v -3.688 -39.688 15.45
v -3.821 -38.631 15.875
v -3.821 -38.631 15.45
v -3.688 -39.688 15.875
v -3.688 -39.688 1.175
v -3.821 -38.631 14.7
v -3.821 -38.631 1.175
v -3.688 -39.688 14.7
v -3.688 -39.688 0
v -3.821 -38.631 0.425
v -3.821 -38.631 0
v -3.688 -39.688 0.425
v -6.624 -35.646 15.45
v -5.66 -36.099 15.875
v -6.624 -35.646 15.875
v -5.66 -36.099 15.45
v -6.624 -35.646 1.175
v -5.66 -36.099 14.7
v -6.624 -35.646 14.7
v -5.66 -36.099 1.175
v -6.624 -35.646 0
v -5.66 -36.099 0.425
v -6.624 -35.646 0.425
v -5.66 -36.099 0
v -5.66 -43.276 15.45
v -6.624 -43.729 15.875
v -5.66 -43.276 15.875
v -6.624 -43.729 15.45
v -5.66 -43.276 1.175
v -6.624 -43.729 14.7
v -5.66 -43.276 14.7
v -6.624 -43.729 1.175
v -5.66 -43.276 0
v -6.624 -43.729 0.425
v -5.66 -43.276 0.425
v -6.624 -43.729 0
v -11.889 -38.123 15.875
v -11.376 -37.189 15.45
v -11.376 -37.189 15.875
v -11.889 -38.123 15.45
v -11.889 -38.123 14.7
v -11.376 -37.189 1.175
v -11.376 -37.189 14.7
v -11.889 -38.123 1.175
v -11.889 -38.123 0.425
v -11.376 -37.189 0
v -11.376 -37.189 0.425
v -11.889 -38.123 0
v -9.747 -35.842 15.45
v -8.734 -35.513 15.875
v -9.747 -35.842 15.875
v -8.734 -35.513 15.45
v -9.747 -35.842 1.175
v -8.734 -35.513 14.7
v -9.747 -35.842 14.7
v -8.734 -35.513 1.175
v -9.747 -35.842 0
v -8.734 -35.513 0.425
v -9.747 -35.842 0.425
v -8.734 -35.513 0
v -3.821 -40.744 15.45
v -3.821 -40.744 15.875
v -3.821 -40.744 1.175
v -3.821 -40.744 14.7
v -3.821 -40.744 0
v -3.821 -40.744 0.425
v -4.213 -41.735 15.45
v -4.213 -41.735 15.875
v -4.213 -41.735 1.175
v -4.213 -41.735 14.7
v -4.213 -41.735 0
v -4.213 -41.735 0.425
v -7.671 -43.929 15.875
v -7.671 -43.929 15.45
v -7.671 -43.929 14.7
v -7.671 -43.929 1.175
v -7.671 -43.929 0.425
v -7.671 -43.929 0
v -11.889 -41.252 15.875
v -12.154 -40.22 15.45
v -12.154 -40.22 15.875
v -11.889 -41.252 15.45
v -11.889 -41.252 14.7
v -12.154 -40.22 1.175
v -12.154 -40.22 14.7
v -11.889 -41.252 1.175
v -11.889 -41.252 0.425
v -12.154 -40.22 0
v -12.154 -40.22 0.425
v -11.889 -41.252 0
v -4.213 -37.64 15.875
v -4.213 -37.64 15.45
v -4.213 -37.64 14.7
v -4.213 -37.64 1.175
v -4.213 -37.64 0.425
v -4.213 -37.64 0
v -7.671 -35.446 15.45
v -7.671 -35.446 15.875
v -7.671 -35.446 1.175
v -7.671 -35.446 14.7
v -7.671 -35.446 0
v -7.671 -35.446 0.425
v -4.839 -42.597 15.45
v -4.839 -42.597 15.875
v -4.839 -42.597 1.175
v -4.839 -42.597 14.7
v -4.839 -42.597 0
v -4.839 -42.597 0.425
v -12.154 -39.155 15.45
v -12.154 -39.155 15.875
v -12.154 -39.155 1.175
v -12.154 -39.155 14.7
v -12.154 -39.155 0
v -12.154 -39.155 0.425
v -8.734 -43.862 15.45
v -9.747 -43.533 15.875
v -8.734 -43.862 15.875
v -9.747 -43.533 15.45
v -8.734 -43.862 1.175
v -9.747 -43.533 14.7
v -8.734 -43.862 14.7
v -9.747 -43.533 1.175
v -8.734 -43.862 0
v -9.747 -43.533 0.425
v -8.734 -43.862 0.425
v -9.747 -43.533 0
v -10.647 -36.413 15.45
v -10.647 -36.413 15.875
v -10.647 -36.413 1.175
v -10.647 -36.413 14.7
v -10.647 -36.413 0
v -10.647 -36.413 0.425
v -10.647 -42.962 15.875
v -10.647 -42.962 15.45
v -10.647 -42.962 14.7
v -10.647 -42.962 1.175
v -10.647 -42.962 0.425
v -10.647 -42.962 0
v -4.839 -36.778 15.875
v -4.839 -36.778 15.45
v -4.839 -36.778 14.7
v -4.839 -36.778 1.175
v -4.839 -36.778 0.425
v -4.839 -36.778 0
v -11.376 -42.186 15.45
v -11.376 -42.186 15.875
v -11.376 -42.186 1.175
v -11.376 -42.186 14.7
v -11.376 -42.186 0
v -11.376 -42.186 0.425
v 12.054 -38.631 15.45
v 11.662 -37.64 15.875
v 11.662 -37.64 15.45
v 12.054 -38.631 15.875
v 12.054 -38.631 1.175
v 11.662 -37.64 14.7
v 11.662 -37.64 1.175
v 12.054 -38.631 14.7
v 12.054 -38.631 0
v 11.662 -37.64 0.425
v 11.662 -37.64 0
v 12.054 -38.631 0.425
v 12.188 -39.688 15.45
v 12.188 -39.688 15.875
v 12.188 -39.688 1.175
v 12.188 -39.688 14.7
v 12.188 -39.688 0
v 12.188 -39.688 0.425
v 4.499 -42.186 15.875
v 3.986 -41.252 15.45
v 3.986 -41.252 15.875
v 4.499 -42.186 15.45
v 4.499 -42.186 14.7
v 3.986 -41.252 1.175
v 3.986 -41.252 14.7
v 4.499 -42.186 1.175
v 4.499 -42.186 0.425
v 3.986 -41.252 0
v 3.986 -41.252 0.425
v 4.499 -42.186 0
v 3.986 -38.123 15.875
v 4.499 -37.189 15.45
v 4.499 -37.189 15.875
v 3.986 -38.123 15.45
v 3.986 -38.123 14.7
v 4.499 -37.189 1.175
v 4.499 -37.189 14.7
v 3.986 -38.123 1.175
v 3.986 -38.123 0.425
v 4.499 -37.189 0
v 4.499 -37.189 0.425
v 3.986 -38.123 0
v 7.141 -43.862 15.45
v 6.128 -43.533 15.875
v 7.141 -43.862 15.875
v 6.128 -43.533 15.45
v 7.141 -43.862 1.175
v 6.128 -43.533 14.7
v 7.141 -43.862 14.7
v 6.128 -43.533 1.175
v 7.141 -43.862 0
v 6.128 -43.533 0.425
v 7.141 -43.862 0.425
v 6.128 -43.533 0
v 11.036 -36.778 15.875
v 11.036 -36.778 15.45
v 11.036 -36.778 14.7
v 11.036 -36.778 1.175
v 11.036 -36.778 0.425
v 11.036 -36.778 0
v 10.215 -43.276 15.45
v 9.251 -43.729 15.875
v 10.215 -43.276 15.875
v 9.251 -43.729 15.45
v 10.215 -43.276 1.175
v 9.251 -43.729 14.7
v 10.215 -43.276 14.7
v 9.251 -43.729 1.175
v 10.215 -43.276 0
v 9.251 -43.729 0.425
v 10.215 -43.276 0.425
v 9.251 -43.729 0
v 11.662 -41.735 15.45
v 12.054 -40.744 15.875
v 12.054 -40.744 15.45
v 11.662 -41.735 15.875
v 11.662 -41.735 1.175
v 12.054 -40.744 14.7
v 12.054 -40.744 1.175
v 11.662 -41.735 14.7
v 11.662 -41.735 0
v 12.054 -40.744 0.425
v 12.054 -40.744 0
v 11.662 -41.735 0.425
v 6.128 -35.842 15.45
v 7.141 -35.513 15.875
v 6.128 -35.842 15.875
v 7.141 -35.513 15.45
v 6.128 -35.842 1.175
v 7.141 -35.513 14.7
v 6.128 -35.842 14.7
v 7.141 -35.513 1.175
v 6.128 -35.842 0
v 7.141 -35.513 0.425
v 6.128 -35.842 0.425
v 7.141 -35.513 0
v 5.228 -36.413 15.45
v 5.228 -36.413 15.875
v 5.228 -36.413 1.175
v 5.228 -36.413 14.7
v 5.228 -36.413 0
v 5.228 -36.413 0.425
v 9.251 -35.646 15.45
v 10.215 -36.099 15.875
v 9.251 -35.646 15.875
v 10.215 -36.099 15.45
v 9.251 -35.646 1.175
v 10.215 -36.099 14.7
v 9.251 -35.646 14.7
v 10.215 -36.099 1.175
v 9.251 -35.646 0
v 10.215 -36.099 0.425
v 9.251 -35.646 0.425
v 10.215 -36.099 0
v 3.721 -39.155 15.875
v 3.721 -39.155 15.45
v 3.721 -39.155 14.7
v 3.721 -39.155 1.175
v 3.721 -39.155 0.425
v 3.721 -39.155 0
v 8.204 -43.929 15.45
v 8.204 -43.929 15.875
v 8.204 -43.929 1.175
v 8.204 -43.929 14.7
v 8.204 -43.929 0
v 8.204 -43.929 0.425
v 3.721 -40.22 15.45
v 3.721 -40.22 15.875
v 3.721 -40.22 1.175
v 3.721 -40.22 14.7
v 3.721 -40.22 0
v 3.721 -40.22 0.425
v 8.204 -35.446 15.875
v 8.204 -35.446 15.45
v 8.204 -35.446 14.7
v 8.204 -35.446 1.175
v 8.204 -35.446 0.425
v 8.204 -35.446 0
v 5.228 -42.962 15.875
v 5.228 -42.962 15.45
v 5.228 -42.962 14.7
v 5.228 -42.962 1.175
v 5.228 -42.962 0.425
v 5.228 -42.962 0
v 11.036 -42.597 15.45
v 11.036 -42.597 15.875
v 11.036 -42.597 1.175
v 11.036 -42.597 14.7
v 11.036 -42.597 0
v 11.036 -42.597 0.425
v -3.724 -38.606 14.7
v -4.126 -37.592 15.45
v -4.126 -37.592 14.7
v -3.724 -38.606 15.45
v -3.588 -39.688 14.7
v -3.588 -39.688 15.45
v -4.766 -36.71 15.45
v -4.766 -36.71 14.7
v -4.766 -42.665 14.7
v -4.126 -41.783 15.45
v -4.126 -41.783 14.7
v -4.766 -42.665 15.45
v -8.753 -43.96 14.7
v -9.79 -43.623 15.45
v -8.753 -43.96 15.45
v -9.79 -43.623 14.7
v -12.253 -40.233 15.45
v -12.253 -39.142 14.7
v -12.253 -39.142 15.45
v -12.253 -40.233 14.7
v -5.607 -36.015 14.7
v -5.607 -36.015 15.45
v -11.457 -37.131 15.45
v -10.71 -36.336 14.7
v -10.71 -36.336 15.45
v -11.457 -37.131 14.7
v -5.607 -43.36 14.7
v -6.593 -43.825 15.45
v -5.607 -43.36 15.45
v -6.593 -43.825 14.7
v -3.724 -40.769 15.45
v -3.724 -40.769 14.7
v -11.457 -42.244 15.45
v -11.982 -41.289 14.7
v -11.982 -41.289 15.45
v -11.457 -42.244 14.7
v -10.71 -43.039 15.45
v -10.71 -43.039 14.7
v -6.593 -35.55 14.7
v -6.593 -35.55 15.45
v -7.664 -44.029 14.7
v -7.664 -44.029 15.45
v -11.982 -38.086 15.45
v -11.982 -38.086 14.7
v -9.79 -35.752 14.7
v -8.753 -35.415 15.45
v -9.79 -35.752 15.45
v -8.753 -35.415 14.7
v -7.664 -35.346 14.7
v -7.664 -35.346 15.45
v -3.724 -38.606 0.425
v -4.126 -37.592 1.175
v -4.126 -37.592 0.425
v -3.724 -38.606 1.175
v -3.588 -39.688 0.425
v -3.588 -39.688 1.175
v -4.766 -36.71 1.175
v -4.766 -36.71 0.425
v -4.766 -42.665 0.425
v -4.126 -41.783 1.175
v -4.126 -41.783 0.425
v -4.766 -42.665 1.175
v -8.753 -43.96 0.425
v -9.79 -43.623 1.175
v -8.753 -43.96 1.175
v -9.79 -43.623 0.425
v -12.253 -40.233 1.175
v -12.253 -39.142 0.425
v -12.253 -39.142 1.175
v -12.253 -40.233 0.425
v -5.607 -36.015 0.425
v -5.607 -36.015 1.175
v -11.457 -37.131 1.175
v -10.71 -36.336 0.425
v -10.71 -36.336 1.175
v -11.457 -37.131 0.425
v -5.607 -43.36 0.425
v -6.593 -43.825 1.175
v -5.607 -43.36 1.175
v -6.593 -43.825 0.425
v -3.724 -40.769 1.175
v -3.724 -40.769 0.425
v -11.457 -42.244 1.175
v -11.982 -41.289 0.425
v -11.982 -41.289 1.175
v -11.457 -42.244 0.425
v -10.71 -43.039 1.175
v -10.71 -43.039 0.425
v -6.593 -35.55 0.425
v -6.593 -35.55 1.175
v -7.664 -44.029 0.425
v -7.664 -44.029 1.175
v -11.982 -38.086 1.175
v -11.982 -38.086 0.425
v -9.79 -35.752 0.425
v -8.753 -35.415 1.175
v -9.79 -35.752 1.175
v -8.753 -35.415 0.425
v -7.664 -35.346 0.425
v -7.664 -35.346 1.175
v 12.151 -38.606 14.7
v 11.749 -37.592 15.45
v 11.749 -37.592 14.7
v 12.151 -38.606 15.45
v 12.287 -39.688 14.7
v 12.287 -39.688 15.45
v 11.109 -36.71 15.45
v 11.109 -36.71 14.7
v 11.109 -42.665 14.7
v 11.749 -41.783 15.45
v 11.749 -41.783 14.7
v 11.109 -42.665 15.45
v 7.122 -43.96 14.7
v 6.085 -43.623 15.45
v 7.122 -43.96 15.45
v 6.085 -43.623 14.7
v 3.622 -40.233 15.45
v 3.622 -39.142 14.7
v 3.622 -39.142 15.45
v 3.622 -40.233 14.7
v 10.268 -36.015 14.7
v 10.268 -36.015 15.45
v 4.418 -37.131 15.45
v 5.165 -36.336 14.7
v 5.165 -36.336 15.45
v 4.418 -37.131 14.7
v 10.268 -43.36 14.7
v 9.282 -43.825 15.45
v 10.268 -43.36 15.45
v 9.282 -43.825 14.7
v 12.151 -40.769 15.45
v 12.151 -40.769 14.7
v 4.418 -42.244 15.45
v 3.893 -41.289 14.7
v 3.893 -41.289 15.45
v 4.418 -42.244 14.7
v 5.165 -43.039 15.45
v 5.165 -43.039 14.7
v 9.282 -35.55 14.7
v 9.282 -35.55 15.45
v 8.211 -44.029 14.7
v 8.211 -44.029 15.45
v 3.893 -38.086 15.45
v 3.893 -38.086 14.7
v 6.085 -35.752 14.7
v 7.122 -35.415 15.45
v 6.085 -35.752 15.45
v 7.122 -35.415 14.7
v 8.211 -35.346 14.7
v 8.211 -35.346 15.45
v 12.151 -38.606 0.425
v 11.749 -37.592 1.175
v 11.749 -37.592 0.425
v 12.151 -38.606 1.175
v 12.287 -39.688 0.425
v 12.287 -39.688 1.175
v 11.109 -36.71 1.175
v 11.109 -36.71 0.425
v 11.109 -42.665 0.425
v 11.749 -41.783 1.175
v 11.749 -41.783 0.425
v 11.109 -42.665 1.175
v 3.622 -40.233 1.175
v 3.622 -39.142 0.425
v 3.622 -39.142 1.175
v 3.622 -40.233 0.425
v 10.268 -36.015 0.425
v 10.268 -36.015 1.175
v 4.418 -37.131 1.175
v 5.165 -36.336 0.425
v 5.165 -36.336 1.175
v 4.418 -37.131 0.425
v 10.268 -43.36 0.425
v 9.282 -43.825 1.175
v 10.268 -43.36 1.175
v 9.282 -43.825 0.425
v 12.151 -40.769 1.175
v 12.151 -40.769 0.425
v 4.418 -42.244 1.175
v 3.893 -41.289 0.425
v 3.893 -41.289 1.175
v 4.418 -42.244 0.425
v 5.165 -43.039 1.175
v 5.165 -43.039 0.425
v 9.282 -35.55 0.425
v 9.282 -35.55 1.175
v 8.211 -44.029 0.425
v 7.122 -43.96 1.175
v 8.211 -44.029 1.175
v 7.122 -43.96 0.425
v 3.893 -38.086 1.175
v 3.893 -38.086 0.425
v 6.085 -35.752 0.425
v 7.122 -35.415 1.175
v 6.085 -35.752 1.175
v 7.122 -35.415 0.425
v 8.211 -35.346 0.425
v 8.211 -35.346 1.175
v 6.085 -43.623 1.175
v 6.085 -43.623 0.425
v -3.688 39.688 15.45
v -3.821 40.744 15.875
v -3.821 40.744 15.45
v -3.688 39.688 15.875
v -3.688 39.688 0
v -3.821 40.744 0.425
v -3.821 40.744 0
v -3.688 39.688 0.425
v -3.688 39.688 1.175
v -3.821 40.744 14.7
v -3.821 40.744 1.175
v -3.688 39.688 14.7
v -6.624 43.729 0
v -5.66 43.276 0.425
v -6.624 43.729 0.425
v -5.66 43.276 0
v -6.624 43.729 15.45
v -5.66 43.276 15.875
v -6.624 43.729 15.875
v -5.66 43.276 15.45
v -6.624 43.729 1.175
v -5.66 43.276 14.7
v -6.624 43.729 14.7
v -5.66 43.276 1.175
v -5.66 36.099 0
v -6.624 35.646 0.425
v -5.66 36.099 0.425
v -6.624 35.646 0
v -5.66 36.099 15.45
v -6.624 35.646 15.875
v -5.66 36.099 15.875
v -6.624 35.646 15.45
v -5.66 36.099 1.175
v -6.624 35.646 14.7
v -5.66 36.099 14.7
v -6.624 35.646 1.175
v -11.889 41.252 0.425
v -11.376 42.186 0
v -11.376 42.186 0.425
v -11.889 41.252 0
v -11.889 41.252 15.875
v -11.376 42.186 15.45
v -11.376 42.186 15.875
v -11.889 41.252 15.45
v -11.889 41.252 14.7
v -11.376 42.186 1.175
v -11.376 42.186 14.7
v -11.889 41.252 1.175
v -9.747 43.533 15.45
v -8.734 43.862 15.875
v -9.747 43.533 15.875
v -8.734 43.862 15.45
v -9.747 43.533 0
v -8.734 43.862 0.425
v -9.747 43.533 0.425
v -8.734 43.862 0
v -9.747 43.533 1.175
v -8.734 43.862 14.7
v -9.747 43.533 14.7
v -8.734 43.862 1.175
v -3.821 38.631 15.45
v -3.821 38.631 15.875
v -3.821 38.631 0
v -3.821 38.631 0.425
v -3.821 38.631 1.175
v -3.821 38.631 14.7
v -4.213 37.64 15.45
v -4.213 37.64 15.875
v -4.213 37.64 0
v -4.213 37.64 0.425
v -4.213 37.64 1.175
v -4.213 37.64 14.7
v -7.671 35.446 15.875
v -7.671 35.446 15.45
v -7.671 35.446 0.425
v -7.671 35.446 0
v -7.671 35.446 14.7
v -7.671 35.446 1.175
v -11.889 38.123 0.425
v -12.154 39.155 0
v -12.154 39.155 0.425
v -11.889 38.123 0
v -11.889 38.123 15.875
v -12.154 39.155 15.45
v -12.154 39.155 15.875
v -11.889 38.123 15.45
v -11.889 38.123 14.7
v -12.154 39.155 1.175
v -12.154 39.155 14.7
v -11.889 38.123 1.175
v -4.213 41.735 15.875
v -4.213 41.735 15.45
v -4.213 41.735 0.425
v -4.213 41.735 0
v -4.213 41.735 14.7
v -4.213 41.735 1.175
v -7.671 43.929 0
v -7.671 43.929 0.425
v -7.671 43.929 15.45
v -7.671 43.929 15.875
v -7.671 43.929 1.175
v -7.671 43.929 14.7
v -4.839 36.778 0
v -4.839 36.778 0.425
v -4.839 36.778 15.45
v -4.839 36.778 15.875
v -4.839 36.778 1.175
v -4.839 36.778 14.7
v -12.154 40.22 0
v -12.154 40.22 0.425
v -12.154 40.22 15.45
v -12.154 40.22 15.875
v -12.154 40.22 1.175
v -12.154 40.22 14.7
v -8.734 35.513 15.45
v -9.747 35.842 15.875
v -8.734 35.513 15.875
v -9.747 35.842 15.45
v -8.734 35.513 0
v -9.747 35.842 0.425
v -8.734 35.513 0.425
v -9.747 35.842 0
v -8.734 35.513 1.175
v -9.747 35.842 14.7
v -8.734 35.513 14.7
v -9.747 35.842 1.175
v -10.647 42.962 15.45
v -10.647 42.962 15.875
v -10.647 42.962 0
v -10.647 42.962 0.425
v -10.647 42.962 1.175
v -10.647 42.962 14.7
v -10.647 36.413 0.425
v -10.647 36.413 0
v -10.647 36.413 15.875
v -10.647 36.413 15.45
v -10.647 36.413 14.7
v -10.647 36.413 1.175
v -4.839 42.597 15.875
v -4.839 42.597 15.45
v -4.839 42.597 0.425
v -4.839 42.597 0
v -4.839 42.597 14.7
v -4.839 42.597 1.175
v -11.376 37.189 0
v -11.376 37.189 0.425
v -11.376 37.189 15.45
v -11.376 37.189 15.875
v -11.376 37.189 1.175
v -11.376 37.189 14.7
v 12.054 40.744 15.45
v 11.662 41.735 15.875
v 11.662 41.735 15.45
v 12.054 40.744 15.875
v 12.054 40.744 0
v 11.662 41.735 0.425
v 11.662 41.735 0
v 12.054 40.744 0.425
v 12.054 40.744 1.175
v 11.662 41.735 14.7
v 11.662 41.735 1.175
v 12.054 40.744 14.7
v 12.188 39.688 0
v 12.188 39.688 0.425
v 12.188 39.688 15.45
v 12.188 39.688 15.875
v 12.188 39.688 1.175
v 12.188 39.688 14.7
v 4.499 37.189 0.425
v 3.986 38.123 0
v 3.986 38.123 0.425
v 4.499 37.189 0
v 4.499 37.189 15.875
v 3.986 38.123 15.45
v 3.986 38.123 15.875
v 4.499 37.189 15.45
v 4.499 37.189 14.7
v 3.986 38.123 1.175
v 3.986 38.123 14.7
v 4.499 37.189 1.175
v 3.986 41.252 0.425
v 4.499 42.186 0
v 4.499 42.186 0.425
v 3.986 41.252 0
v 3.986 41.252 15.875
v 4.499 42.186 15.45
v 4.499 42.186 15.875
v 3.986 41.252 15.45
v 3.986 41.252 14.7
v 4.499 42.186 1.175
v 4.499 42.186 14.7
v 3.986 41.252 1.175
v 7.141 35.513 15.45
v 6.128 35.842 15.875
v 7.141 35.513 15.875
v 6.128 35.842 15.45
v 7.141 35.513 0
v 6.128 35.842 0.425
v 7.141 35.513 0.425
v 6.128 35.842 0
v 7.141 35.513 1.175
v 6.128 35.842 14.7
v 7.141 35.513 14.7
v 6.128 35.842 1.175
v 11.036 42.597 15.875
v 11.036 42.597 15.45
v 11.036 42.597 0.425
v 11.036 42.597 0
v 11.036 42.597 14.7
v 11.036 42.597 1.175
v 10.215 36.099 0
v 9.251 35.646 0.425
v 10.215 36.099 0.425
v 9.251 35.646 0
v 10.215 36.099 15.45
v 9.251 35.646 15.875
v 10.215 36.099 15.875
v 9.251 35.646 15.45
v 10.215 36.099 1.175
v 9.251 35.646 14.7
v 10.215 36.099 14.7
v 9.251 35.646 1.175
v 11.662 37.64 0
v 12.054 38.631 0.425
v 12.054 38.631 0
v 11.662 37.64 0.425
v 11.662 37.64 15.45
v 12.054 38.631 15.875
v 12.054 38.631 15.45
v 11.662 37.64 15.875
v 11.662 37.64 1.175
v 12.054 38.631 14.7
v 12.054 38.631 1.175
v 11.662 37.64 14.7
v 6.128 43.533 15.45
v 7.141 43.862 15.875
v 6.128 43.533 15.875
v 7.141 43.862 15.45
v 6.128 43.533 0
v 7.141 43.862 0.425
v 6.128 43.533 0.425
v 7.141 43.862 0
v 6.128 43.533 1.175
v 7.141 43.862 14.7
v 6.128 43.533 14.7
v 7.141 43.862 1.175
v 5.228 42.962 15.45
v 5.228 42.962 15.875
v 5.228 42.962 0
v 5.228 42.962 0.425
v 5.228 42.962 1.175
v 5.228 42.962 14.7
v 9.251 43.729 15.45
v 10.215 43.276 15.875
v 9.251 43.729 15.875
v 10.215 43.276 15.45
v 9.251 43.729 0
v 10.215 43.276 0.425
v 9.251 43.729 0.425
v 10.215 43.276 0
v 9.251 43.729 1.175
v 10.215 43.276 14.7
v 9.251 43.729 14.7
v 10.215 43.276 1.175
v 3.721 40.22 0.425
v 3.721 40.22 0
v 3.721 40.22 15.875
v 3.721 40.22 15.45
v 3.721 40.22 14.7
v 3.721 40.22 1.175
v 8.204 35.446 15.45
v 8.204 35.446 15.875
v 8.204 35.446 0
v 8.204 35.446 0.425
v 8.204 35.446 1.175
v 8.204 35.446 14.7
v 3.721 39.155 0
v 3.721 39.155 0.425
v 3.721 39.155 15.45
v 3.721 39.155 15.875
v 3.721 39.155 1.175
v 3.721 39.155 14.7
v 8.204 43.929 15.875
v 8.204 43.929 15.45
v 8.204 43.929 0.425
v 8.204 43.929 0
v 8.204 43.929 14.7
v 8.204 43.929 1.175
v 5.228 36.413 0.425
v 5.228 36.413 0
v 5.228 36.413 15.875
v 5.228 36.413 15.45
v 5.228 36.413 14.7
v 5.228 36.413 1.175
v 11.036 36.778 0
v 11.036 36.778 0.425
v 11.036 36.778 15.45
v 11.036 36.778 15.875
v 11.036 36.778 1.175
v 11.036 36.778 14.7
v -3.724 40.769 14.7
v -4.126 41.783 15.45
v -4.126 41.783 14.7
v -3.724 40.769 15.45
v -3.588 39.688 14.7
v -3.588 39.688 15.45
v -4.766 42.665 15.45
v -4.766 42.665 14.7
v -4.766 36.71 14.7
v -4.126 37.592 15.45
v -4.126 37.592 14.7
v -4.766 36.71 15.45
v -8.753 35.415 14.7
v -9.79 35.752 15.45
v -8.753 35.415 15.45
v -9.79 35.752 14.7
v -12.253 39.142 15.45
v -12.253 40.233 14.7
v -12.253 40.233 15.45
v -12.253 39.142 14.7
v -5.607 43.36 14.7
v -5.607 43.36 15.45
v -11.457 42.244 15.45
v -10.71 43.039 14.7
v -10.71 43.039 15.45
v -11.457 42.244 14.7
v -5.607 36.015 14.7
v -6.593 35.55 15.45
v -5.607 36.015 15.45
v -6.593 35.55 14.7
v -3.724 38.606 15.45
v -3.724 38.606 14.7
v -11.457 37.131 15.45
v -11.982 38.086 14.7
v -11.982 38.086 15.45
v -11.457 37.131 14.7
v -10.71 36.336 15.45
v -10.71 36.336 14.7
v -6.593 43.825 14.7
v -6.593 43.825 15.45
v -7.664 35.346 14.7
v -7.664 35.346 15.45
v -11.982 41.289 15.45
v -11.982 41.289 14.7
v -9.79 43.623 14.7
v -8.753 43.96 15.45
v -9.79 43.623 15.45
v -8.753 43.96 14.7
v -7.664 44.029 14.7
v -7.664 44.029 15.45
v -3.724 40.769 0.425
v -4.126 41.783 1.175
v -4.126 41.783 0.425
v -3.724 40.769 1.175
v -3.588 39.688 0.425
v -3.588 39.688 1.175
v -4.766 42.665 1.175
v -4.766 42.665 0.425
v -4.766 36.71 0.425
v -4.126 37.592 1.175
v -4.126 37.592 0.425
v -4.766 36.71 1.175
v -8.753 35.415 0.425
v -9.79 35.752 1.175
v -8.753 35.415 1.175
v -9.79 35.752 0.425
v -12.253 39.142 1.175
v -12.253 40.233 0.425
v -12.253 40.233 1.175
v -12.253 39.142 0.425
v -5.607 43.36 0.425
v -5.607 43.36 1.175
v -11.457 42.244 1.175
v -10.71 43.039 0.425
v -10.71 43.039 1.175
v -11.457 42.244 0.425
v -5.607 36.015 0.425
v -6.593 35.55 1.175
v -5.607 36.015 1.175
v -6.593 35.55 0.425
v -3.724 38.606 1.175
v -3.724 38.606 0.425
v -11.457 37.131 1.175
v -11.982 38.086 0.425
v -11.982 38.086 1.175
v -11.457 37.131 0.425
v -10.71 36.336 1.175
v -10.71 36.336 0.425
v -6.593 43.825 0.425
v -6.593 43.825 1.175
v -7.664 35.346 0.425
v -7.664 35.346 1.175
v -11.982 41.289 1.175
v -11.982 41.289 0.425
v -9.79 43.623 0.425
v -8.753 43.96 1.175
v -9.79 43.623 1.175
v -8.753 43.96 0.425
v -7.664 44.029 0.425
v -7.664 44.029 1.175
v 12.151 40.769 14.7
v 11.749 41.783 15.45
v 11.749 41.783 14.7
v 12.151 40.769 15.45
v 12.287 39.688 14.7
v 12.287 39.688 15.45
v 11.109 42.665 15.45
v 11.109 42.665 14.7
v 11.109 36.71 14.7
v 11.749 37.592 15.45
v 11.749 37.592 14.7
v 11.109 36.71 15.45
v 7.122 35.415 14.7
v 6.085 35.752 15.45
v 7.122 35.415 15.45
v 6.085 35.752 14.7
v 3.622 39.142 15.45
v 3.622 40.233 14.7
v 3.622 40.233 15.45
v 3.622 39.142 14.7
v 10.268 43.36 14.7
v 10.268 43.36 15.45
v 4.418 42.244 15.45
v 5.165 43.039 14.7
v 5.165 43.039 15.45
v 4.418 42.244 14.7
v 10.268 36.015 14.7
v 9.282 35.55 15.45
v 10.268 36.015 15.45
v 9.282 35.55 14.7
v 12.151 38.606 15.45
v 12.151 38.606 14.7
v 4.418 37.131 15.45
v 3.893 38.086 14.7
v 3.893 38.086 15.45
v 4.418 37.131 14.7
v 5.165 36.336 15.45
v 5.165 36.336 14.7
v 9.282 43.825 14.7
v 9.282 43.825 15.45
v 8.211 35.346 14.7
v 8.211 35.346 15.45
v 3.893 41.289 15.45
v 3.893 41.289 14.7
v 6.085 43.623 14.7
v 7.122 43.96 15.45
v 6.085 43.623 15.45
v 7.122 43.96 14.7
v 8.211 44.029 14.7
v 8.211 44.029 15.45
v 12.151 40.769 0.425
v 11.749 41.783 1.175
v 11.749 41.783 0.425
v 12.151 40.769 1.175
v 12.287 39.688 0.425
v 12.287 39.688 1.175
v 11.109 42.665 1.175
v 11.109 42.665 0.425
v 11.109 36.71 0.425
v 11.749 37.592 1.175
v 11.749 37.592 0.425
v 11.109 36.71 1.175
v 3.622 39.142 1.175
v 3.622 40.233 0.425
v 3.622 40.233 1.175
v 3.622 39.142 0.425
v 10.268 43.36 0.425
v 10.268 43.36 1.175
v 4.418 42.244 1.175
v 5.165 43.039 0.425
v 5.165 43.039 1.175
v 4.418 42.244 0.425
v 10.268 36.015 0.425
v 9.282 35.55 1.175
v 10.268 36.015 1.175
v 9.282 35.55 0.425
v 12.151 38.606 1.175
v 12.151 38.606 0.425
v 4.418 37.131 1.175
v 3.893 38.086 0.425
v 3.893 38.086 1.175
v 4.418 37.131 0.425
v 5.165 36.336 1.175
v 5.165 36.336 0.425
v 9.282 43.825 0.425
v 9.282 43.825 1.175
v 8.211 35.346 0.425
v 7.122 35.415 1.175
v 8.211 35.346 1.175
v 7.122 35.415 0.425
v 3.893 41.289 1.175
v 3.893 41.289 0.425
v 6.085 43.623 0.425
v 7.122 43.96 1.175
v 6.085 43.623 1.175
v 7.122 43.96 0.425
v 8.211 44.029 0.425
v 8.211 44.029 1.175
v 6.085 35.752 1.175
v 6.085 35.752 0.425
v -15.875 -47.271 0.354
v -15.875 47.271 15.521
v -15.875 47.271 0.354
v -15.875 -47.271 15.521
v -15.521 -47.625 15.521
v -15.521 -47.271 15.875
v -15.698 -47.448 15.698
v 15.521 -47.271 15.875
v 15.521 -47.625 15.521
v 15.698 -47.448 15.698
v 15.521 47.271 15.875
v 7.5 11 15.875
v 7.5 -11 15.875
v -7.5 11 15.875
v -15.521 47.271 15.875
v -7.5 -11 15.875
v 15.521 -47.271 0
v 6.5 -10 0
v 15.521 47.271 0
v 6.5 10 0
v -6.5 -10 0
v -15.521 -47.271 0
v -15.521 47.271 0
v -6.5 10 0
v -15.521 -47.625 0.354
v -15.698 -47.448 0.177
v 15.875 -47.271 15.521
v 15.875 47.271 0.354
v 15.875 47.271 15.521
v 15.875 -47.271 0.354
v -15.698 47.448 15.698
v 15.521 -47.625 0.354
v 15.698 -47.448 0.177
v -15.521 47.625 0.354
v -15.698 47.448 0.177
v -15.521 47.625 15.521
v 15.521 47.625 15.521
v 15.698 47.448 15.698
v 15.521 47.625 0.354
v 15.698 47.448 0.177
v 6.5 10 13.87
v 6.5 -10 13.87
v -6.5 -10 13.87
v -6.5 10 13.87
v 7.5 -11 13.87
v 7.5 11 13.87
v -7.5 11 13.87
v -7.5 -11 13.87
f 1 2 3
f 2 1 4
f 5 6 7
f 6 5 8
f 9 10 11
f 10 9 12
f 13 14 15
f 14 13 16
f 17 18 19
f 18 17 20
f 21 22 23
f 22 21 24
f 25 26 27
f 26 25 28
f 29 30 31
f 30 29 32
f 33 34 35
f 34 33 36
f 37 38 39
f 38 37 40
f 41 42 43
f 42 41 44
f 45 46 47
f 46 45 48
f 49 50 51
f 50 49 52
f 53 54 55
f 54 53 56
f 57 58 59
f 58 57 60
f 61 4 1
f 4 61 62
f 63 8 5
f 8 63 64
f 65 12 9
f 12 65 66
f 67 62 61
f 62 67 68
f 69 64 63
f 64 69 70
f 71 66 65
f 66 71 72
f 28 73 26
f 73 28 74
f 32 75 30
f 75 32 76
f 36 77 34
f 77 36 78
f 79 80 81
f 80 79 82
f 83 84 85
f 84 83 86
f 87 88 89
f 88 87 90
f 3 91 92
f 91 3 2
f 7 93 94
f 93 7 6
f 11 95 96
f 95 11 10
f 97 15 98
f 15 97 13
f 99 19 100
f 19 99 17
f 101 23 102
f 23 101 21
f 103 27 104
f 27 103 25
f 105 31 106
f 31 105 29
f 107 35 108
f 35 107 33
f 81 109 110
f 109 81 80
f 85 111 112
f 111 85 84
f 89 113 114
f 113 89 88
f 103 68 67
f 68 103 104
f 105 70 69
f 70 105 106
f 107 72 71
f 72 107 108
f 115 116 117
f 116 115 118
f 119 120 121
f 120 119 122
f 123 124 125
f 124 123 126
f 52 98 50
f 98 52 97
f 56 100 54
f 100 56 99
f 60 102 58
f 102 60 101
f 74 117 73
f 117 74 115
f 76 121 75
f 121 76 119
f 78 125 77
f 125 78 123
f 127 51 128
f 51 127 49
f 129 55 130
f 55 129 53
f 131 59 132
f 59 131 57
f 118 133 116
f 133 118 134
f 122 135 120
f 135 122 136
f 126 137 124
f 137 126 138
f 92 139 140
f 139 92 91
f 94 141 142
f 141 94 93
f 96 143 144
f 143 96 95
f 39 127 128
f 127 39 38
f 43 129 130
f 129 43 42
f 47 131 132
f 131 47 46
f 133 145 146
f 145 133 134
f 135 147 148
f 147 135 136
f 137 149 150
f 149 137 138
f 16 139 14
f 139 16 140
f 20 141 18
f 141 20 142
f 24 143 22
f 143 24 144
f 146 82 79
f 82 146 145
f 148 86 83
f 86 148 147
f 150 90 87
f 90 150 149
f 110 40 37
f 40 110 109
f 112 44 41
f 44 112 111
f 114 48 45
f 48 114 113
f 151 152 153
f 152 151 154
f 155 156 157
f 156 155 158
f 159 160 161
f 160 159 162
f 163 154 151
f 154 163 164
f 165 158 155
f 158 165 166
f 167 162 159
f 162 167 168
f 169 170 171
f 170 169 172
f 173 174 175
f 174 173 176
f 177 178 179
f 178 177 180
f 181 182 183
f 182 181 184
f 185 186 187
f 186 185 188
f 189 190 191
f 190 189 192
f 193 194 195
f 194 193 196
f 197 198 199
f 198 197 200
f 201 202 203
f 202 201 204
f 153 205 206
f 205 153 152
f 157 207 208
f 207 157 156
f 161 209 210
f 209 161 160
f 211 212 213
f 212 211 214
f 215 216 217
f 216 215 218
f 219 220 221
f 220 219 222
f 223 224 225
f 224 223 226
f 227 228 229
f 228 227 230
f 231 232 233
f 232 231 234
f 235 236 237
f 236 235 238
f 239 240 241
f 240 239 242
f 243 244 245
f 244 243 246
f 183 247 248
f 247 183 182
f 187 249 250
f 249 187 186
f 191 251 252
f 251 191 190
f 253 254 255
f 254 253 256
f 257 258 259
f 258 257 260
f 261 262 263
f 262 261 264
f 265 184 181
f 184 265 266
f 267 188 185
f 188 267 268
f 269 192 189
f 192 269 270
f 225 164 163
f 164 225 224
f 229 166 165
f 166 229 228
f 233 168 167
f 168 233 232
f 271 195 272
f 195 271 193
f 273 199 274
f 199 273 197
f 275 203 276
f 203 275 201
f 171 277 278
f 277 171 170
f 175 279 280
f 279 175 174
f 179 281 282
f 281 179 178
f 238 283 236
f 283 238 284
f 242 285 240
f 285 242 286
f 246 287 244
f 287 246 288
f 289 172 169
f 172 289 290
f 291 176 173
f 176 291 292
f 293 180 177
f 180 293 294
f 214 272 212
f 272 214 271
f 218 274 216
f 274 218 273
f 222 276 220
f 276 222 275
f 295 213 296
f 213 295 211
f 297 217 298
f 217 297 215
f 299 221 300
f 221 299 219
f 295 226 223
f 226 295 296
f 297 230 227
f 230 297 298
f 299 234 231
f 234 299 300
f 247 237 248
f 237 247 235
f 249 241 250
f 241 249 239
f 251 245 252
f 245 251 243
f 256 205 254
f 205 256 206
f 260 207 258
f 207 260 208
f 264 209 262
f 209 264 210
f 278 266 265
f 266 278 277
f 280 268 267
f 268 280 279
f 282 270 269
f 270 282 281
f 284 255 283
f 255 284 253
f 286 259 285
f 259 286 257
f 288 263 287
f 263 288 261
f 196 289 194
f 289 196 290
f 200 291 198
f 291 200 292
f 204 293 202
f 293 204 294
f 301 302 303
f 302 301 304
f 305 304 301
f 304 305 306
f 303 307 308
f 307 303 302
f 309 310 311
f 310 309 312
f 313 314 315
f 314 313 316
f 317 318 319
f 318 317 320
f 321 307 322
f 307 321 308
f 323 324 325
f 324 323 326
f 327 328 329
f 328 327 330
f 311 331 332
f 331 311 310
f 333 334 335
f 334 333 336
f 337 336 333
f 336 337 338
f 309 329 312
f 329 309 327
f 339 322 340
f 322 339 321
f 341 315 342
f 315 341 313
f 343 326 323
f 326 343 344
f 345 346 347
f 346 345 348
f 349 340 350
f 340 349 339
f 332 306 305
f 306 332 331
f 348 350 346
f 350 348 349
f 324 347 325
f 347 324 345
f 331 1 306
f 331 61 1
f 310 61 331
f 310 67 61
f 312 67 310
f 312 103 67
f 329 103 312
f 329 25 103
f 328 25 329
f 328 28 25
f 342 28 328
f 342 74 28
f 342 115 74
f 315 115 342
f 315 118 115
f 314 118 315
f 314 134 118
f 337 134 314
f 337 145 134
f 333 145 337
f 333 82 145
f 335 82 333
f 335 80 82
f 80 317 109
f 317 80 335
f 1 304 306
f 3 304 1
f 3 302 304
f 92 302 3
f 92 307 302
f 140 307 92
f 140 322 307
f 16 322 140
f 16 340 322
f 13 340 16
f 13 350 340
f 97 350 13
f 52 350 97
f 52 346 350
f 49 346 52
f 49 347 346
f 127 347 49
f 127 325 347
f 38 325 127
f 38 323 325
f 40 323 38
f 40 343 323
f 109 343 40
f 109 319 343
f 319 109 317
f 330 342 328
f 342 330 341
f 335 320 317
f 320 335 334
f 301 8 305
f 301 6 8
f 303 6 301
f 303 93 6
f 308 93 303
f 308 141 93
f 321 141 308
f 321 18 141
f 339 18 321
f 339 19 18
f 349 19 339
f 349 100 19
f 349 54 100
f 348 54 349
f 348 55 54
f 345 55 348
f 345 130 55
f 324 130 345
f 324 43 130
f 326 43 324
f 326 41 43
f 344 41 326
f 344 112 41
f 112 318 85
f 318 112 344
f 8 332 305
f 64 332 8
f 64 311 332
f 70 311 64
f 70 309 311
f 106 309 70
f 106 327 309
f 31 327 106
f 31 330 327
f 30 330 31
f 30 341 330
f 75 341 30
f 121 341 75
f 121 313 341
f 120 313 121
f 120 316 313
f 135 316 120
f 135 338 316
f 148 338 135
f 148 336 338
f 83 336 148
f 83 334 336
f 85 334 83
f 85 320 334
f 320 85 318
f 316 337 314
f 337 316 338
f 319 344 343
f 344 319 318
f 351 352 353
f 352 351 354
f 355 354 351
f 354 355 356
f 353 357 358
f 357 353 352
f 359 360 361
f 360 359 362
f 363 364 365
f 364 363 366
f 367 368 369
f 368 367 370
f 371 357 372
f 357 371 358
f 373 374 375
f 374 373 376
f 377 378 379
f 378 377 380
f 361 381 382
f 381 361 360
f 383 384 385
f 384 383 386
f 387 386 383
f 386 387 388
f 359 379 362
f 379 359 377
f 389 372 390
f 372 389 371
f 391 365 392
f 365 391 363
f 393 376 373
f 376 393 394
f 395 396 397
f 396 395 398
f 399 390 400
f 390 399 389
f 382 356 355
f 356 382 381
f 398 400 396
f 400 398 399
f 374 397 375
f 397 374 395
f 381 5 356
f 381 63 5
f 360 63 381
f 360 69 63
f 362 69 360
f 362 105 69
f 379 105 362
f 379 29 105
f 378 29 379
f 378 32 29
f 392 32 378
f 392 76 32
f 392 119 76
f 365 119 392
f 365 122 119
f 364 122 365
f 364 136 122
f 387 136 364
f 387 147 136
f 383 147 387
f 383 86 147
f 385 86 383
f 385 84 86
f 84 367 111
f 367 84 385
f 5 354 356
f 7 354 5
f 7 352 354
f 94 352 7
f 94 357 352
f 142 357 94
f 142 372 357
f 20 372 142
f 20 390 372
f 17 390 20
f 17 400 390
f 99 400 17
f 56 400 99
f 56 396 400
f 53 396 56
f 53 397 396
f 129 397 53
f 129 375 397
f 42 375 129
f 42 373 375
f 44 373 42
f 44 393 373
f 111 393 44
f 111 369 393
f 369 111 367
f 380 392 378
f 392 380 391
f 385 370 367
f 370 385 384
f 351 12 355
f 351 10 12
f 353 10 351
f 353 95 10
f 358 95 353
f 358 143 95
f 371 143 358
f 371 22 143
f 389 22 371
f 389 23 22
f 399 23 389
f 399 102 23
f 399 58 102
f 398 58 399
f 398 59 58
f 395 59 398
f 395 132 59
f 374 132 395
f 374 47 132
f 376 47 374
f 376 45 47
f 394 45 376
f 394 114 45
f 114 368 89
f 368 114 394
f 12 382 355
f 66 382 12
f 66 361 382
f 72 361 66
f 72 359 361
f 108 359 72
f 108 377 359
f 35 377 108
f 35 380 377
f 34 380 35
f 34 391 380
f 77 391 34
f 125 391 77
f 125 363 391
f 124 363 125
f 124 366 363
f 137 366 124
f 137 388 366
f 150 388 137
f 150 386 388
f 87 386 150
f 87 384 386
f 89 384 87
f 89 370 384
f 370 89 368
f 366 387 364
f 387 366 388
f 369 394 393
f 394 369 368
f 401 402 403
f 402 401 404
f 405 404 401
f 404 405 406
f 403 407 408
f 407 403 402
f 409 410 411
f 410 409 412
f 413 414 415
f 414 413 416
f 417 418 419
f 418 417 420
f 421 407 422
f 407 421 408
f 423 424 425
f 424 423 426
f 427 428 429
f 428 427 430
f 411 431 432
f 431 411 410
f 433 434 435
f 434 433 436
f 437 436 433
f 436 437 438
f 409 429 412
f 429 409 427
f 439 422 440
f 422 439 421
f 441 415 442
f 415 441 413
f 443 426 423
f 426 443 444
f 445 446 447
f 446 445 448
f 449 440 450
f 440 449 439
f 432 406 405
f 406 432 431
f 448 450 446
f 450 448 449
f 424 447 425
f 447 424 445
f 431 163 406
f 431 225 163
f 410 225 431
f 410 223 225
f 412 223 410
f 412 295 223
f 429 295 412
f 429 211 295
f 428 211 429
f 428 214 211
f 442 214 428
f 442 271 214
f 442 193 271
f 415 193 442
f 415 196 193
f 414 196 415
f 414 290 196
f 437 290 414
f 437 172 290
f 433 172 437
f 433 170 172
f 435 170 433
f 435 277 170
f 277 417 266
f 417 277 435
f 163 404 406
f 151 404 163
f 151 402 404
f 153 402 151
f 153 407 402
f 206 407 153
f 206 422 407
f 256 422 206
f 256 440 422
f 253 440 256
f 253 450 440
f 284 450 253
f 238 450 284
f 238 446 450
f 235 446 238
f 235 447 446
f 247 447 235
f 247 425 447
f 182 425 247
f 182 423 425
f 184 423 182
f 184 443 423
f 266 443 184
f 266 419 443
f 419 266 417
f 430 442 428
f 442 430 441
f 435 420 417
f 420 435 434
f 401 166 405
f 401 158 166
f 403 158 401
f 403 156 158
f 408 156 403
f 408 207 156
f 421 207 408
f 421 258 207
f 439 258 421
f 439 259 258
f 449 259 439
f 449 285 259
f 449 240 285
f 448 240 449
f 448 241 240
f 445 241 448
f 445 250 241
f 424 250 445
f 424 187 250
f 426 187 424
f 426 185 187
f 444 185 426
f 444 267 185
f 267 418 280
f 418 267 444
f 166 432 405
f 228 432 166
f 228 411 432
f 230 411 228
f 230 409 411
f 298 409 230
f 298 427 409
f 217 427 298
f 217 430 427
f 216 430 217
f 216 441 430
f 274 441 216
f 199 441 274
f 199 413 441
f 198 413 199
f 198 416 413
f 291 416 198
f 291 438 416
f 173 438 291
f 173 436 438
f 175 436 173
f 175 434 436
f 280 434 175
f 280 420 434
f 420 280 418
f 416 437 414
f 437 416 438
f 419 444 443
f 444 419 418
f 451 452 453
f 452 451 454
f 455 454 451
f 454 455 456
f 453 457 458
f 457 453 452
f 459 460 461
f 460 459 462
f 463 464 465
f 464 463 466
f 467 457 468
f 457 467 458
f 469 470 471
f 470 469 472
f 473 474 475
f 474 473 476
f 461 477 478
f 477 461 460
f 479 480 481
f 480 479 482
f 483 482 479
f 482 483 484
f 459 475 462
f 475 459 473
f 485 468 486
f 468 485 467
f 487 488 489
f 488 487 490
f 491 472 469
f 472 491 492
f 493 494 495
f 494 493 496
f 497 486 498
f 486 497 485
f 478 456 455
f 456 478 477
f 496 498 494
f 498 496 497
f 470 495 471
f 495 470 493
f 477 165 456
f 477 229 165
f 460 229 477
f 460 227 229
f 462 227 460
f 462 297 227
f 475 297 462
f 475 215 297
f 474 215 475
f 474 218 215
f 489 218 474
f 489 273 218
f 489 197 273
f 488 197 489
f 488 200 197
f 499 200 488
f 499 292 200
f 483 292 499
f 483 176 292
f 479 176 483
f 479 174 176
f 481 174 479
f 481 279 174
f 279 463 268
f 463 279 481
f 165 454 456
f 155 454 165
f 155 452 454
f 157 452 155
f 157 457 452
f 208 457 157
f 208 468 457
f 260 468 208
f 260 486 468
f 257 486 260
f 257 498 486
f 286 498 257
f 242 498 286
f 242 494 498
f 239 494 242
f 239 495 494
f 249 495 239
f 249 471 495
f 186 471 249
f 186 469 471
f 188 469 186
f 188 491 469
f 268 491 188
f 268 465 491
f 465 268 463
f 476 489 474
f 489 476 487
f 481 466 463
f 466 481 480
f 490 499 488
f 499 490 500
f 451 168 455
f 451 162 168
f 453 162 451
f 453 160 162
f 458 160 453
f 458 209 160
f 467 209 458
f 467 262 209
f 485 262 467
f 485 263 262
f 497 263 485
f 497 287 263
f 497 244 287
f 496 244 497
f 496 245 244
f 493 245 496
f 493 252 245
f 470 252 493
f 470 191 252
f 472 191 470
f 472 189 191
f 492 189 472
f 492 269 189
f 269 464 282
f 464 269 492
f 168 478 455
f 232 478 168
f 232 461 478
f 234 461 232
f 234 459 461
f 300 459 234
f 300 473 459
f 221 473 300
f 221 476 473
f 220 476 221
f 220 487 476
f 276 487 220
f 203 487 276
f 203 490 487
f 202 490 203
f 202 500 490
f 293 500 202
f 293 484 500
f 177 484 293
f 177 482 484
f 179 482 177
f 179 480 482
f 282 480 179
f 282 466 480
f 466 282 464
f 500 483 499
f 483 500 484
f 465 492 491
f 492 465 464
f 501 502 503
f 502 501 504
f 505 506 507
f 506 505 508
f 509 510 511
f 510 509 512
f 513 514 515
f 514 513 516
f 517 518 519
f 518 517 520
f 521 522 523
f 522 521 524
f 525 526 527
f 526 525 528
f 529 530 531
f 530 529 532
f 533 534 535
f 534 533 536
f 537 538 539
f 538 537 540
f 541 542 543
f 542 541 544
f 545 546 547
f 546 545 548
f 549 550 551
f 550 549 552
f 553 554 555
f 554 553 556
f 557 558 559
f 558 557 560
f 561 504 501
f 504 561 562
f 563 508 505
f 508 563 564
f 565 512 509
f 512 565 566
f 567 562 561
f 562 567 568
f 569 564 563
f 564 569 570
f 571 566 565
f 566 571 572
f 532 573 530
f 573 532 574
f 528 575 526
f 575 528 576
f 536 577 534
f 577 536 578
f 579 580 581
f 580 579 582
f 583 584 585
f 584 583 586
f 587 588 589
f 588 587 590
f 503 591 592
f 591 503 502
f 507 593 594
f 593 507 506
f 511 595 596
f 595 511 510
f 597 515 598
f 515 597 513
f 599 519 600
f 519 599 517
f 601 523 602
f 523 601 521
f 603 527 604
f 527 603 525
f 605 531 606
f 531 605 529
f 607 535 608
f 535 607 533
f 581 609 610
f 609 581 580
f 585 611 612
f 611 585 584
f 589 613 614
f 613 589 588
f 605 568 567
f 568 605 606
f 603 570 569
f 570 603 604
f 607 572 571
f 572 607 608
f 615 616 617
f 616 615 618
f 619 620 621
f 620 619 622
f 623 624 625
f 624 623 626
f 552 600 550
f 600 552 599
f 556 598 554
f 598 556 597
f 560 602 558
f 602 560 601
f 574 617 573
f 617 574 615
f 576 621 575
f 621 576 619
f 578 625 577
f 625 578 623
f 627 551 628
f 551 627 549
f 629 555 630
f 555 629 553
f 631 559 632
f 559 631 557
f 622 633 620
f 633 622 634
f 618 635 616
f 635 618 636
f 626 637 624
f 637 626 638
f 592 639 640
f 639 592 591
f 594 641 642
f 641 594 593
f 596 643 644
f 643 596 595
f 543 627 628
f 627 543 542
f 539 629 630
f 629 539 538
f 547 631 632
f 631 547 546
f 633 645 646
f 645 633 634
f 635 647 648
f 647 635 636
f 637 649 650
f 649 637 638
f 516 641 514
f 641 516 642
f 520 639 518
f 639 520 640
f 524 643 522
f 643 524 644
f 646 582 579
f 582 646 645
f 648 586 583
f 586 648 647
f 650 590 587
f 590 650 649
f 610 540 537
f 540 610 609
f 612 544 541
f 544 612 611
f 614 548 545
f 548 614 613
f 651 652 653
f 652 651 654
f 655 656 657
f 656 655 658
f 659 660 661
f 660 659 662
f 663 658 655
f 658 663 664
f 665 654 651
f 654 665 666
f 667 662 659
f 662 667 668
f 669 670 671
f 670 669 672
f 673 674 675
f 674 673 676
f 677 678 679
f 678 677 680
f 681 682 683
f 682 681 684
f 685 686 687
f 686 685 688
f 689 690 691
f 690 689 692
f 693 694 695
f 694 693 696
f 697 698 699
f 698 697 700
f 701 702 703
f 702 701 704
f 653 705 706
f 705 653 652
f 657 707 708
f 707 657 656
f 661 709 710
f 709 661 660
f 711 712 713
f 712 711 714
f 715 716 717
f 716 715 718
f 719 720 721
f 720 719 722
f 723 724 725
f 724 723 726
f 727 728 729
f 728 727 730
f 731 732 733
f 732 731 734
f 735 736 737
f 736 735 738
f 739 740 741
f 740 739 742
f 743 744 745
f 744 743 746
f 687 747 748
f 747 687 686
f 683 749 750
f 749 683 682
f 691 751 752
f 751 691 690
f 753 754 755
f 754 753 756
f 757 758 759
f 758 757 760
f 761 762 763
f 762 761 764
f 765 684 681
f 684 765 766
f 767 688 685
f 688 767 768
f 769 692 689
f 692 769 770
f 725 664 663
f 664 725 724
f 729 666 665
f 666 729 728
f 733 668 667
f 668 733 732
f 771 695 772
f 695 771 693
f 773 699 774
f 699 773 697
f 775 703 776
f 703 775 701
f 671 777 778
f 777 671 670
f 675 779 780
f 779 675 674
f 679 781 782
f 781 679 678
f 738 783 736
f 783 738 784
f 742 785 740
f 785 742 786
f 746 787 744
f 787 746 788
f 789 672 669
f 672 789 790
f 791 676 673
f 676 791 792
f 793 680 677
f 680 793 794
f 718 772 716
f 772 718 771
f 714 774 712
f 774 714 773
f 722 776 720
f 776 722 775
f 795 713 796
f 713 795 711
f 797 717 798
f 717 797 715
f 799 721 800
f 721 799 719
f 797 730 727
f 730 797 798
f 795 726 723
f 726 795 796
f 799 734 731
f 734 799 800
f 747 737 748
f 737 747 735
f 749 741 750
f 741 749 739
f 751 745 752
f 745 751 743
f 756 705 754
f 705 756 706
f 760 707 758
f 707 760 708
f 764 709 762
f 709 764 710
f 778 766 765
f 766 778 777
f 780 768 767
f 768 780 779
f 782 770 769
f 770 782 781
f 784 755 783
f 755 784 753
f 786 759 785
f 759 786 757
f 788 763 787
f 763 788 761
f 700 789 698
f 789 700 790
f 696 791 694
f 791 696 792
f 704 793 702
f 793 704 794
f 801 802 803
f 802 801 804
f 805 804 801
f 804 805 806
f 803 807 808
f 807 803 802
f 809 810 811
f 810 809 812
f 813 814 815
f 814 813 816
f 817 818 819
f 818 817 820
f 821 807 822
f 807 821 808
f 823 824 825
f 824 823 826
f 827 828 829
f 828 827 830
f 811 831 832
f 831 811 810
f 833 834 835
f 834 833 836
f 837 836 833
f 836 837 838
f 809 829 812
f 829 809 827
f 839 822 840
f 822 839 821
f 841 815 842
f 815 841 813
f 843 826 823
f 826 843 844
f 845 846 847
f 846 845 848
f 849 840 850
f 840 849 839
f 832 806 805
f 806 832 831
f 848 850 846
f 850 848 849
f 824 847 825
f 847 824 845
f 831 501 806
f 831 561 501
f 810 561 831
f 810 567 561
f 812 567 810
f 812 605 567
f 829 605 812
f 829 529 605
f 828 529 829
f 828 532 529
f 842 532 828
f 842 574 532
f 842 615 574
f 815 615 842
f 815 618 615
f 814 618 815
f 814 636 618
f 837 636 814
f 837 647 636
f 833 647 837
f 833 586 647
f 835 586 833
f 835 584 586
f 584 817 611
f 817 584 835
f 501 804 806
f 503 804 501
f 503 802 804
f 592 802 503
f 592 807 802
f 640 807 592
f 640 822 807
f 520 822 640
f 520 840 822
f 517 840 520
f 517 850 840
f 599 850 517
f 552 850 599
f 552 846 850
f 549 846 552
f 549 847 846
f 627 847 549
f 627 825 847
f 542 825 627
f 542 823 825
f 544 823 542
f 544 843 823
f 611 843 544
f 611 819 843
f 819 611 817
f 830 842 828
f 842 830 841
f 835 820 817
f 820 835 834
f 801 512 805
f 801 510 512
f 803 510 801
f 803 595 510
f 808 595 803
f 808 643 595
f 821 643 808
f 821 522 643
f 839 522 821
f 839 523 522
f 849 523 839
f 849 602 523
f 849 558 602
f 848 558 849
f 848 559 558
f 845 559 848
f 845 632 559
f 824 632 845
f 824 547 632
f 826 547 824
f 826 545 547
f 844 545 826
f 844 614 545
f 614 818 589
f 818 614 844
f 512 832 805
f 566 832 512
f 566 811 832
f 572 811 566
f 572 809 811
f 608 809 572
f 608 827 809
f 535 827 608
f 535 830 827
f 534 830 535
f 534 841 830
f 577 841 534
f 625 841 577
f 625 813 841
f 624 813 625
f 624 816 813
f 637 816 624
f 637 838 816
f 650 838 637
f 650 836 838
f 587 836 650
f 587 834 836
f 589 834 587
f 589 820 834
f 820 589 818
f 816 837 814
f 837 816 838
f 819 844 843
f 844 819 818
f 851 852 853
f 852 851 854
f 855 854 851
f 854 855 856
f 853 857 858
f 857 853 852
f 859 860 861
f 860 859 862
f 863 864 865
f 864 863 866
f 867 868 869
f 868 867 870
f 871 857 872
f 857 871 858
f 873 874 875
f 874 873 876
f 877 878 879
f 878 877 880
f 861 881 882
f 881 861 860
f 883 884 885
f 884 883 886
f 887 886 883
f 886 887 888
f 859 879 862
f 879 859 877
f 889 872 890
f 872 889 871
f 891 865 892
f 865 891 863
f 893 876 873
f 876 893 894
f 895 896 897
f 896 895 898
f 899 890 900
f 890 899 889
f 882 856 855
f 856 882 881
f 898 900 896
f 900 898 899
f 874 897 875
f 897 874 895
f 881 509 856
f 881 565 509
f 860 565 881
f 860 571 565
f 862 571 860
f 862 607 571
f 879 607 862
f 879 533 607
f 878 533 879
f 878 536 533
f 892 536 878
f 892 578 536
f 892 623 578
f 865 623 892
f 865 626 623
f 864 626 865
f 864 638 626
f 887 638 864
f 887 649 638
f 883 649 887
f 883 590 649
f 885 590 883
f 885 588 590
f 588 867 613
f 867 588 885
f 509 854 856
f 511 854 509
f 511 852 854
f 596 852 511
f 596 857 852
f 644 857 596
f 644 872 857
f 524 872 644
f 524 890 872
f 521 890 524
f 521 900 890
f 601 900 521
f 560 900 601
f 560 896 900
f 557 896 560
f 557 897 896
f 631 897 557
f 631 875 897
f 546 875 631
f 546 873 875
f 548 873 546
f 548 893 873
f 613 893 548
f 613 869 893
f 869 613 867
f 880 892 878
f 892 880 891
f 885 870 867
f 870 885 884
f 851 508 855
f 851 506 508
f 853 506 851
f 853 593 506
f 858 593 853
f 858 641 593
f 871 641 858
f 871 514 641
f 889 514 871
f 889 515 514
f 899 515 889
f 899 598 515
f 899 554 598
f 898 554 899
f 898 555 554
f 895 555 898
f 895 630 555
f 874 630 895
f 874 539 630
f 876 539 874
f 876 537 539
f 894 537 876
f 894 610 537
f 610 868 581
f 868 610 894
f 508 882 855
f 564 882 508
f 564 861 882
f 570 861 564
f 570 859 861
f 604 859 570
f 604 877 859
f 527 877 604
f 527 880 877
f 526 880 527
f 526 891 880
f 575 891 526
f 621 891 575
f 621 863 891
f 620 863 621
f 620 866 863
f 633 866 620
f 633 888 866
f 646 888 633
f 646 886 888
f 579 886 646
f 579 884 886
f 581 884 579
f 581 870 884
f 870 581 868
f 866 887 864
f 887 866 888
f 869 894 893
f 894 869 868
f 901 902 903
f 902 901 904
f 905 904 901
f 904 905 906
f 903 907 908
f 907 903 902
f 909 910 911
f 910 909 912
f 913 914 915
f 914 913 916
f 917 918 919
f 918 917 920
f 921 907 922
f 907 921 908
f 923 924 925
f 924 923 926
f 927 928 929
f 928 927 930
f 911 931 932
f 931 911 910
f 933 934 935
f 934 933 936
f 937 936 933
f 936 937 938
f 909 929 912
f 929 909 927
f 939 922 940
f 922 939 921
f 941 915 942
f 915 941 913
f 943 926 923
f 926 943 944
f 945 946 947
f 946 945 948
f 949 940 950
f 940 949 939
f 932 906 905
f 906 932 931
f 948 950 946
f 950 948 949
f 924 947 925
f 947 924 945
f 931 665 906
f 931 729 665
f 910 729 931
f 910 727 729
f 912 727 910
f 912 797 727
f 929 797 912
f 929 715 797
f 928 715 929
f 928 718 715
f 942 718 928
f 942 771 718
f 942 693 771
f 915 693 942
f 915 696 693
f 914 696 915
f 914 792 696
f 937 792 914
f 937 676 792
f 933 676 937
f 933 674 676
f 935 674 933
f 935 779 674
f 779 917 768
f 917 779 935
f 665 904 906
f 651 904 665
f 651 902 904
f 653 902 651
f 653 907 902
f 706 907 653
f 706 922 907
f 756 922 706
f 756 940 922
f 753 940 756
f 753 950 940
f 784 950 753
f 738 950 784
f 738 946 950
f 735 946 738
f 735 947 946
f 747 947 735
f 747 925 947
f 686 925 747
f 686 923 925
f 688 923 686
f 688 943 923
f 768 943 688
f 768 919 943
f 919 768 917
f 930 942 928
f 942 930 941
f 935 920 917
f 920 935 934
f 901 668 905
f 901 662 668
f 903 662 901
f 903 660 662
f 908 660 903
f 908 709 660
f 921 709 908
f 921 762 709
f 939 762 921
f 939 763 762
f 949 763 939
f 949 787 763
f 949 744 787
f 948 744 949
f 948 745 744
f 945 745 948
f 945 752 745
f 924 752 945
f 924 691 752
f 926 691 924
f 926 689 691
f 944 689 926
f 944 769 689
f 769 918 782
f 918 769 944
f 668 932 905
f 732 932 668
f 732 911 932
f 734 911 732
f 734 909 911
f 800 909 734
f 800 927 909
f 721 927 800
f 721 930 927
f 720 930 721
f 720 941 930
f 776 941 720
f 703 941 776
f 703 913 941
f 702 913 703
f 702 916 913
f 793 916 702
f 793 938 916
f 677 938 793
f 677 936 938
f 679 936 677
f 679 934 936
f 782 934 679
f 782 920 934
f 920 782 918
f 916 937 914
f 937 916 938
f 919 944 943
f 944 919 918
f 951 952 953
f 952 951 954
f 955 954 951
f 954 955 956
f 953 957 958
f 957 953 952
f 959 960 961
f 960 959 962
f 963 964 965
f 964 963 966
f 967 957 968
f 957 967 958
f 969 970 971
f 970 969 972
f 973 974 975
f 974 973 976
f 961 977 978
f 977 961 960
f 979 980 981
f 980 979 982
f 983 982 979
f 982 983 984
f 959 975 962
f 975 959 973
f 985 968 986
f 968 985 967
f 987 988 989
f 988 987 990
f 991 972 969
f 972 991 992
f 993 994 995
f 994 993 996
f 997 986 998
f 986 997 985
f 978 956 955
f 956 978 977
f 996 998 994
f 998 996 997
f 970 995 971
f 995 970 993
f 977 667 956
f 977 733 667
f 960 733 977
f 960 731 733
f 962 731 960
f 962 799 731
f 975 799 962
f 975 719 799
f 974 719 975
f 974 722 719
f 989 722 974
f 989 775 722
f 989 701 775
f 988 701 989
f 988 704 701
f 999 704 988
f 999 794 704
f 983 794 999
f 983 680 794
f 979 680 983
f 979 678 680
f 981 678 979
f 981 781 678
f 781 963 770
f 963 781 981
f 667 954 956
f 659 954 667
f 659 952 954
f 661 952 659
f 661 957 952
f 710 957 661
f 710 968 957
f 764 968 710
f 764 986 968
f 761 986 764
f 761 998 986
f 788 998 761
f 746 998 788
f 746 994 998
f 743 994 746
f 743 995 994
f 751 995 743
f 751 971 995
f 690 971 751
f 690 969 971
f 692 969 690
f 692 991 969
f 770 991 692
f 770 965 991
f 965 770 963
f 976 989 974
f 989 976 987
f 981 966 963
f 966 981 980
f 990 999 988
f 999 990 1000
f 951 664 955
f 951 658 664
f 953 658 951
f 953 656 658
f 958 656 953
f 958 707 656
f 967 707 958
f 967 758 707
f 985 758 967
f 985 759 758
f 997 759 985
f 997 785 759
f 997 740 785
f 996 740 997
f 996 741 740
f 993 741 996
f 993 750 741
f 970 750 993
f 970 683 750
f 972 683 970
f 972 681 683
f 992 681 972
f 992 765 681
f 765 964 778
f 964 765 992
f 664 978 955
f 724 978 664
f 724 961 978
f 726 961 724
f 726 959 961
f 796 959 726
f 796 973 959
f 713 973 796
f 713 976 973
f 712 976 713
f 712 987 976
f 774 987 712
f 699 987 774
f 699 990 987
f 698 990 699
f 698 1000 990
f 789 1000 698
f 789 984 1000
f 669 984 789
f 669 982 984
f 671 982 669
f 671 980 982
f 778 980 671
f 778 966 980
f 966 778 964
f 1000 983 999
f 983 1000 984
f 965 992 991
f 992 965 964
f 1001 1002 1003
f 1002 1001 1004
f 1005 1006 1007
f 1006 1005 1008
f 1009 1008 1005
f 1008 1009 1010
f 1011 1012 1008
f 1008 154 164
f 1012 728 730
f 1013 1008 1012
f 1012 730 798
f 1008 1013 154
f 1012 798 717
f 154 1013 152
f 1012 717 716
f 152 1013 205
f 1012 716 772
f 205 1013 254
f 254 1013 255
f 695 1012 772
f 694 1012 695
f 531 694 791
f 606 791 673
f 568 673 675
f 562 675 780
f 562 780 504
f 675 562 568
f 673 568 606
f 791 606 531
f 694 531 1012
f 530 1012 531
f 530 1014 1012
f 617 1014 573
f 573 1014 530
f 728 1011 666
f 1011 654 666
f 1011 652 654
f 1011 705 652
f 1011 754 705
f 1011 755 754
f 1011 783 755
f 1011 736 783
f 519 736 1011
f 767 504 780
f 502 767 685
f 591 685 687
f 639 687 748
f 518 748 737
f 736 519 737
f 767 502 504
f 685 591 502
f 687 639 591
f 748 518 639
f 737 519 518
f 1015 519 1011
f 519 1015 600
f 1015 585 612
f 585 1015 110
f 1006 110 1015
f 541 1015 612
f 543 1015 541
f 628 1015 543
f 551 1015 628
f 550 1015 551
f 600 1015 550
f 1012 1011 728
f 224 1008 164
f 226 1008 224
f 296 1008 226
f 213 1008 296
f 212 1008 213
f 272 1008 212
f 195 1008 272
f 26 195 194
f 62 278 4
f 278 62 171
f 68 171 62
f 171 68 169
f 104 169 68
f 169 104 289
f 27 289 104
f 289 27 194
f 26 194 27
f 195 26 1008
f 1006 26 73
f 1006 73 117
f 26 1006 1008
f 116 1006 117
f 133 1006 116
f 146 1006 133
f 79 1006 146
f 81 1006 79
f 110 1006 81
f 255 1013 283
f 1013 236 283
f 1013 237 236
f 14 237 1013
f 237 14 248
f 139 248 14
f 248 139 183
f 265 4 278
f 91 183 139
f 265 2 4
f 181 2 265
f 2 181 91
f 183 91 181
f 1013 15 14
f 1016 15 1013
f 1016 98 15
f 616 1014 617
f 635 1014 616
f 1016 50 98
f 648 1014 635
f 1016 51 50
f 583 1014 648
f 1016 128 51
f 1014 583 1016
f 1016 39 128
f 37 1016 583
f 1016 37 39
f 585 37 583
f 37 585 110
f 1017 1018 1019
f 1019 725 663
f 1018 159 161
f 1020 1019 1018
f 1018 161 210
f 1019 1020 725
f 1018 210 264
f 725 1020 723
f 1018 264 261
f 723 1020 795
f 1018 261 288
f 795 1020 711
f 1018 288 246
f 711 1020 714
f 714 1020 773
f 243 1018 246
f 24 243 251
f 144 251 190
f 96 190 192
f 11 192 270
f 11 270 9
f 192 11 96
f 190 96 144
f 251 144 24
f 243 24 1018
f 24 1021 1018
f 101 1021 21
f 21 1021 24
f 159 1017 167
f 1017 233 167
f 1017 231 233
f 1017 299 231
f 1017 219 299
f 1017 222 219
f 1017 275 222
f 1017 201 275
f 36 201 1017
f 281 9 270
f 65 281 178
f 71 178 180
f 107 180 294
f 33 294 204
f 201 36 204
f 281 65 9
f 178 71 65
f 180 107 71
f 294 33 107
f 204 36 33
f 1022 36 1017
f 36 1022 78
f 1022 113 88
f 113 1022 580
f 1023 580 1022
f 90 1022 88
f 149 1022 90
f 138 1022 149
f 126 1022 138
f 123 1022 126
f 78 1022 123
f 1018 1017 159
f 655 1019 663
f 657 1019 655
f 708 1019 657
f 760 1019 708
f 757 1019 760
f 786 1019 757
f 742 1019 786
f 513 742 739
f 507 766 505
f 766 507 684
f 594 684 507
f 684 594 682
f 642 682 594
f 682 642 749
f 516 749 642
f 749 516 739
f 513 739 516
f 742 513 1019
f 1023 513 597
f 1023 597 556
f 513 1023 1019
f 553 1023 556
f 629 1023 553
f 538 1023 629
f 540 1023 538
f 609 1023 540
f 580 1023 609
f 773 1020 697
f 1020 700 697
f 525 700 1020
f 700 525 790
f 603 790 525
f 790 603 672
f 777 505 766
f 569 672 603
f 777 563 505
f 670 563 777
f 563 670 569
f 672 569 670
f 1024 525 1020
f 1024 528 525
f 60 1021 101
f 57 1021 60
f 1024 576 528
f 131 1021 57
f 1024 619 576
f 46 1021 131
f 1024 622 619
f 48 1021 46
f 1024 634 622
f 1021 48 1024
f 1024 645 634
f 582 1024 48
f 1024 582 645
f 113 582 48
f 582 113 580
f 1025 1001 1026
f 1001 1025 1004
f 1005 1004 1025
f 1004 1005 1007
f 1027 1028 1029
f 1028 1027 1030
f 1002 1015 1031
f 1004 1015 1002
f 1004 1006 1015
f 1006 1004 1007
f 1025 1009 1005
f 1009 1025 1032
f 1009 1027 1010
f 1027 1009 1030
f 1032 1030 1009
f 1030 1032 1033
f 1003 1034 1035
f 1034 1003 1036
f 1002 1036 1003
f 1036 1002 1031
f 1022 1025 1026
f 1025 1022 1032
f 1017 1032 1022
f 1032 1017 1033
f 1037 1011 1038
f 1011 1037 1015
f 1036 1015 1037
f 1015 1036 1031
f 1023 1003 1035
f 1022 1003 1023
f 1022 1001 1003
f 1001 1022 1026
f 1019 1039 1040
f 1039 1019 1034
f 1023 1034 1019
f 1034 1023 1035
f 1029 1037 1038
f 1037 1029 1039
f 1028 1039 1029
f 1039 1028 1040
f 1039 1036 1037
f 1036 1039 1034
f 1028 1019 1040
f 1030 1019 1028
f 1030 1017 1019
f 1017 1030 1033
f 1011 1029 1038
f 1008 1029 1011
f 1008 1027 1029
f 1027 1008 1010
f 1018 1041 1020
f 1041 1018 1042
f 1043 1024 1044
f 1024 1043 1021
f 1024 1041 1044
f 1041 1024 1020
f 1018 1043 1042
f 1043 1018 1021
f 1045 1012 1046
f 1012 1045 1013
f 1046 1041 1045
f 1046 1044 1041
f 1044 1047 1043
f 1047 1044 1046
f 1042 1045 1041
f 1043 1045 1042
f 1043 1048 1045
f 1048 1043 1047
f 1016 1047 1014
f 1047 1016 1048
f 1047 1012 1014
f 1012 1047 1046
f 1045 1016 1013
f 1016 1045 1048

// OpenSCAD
// NAME: Switch Box
// CATEGORY: Electric
// LDRAW: 27

include <bitbeam-lib/bitbeam-lib.scad>

module bb_switch(){
    difference(){
        cube_plate(2, 6, holes=[0, 2]);
        translate([unit*0.5, unit*2.5, 0])
            cube([13, 20, unit*1.01], center=true);
        translate([unit*0.5, unit*2.5, unit*0.5-1])
            cube([15, 22, 2.01], center=true);
    }
}

translate([unit/-2, -2.5*unit, unit/2])
    color("YellowGreen")
    bb_switch();
